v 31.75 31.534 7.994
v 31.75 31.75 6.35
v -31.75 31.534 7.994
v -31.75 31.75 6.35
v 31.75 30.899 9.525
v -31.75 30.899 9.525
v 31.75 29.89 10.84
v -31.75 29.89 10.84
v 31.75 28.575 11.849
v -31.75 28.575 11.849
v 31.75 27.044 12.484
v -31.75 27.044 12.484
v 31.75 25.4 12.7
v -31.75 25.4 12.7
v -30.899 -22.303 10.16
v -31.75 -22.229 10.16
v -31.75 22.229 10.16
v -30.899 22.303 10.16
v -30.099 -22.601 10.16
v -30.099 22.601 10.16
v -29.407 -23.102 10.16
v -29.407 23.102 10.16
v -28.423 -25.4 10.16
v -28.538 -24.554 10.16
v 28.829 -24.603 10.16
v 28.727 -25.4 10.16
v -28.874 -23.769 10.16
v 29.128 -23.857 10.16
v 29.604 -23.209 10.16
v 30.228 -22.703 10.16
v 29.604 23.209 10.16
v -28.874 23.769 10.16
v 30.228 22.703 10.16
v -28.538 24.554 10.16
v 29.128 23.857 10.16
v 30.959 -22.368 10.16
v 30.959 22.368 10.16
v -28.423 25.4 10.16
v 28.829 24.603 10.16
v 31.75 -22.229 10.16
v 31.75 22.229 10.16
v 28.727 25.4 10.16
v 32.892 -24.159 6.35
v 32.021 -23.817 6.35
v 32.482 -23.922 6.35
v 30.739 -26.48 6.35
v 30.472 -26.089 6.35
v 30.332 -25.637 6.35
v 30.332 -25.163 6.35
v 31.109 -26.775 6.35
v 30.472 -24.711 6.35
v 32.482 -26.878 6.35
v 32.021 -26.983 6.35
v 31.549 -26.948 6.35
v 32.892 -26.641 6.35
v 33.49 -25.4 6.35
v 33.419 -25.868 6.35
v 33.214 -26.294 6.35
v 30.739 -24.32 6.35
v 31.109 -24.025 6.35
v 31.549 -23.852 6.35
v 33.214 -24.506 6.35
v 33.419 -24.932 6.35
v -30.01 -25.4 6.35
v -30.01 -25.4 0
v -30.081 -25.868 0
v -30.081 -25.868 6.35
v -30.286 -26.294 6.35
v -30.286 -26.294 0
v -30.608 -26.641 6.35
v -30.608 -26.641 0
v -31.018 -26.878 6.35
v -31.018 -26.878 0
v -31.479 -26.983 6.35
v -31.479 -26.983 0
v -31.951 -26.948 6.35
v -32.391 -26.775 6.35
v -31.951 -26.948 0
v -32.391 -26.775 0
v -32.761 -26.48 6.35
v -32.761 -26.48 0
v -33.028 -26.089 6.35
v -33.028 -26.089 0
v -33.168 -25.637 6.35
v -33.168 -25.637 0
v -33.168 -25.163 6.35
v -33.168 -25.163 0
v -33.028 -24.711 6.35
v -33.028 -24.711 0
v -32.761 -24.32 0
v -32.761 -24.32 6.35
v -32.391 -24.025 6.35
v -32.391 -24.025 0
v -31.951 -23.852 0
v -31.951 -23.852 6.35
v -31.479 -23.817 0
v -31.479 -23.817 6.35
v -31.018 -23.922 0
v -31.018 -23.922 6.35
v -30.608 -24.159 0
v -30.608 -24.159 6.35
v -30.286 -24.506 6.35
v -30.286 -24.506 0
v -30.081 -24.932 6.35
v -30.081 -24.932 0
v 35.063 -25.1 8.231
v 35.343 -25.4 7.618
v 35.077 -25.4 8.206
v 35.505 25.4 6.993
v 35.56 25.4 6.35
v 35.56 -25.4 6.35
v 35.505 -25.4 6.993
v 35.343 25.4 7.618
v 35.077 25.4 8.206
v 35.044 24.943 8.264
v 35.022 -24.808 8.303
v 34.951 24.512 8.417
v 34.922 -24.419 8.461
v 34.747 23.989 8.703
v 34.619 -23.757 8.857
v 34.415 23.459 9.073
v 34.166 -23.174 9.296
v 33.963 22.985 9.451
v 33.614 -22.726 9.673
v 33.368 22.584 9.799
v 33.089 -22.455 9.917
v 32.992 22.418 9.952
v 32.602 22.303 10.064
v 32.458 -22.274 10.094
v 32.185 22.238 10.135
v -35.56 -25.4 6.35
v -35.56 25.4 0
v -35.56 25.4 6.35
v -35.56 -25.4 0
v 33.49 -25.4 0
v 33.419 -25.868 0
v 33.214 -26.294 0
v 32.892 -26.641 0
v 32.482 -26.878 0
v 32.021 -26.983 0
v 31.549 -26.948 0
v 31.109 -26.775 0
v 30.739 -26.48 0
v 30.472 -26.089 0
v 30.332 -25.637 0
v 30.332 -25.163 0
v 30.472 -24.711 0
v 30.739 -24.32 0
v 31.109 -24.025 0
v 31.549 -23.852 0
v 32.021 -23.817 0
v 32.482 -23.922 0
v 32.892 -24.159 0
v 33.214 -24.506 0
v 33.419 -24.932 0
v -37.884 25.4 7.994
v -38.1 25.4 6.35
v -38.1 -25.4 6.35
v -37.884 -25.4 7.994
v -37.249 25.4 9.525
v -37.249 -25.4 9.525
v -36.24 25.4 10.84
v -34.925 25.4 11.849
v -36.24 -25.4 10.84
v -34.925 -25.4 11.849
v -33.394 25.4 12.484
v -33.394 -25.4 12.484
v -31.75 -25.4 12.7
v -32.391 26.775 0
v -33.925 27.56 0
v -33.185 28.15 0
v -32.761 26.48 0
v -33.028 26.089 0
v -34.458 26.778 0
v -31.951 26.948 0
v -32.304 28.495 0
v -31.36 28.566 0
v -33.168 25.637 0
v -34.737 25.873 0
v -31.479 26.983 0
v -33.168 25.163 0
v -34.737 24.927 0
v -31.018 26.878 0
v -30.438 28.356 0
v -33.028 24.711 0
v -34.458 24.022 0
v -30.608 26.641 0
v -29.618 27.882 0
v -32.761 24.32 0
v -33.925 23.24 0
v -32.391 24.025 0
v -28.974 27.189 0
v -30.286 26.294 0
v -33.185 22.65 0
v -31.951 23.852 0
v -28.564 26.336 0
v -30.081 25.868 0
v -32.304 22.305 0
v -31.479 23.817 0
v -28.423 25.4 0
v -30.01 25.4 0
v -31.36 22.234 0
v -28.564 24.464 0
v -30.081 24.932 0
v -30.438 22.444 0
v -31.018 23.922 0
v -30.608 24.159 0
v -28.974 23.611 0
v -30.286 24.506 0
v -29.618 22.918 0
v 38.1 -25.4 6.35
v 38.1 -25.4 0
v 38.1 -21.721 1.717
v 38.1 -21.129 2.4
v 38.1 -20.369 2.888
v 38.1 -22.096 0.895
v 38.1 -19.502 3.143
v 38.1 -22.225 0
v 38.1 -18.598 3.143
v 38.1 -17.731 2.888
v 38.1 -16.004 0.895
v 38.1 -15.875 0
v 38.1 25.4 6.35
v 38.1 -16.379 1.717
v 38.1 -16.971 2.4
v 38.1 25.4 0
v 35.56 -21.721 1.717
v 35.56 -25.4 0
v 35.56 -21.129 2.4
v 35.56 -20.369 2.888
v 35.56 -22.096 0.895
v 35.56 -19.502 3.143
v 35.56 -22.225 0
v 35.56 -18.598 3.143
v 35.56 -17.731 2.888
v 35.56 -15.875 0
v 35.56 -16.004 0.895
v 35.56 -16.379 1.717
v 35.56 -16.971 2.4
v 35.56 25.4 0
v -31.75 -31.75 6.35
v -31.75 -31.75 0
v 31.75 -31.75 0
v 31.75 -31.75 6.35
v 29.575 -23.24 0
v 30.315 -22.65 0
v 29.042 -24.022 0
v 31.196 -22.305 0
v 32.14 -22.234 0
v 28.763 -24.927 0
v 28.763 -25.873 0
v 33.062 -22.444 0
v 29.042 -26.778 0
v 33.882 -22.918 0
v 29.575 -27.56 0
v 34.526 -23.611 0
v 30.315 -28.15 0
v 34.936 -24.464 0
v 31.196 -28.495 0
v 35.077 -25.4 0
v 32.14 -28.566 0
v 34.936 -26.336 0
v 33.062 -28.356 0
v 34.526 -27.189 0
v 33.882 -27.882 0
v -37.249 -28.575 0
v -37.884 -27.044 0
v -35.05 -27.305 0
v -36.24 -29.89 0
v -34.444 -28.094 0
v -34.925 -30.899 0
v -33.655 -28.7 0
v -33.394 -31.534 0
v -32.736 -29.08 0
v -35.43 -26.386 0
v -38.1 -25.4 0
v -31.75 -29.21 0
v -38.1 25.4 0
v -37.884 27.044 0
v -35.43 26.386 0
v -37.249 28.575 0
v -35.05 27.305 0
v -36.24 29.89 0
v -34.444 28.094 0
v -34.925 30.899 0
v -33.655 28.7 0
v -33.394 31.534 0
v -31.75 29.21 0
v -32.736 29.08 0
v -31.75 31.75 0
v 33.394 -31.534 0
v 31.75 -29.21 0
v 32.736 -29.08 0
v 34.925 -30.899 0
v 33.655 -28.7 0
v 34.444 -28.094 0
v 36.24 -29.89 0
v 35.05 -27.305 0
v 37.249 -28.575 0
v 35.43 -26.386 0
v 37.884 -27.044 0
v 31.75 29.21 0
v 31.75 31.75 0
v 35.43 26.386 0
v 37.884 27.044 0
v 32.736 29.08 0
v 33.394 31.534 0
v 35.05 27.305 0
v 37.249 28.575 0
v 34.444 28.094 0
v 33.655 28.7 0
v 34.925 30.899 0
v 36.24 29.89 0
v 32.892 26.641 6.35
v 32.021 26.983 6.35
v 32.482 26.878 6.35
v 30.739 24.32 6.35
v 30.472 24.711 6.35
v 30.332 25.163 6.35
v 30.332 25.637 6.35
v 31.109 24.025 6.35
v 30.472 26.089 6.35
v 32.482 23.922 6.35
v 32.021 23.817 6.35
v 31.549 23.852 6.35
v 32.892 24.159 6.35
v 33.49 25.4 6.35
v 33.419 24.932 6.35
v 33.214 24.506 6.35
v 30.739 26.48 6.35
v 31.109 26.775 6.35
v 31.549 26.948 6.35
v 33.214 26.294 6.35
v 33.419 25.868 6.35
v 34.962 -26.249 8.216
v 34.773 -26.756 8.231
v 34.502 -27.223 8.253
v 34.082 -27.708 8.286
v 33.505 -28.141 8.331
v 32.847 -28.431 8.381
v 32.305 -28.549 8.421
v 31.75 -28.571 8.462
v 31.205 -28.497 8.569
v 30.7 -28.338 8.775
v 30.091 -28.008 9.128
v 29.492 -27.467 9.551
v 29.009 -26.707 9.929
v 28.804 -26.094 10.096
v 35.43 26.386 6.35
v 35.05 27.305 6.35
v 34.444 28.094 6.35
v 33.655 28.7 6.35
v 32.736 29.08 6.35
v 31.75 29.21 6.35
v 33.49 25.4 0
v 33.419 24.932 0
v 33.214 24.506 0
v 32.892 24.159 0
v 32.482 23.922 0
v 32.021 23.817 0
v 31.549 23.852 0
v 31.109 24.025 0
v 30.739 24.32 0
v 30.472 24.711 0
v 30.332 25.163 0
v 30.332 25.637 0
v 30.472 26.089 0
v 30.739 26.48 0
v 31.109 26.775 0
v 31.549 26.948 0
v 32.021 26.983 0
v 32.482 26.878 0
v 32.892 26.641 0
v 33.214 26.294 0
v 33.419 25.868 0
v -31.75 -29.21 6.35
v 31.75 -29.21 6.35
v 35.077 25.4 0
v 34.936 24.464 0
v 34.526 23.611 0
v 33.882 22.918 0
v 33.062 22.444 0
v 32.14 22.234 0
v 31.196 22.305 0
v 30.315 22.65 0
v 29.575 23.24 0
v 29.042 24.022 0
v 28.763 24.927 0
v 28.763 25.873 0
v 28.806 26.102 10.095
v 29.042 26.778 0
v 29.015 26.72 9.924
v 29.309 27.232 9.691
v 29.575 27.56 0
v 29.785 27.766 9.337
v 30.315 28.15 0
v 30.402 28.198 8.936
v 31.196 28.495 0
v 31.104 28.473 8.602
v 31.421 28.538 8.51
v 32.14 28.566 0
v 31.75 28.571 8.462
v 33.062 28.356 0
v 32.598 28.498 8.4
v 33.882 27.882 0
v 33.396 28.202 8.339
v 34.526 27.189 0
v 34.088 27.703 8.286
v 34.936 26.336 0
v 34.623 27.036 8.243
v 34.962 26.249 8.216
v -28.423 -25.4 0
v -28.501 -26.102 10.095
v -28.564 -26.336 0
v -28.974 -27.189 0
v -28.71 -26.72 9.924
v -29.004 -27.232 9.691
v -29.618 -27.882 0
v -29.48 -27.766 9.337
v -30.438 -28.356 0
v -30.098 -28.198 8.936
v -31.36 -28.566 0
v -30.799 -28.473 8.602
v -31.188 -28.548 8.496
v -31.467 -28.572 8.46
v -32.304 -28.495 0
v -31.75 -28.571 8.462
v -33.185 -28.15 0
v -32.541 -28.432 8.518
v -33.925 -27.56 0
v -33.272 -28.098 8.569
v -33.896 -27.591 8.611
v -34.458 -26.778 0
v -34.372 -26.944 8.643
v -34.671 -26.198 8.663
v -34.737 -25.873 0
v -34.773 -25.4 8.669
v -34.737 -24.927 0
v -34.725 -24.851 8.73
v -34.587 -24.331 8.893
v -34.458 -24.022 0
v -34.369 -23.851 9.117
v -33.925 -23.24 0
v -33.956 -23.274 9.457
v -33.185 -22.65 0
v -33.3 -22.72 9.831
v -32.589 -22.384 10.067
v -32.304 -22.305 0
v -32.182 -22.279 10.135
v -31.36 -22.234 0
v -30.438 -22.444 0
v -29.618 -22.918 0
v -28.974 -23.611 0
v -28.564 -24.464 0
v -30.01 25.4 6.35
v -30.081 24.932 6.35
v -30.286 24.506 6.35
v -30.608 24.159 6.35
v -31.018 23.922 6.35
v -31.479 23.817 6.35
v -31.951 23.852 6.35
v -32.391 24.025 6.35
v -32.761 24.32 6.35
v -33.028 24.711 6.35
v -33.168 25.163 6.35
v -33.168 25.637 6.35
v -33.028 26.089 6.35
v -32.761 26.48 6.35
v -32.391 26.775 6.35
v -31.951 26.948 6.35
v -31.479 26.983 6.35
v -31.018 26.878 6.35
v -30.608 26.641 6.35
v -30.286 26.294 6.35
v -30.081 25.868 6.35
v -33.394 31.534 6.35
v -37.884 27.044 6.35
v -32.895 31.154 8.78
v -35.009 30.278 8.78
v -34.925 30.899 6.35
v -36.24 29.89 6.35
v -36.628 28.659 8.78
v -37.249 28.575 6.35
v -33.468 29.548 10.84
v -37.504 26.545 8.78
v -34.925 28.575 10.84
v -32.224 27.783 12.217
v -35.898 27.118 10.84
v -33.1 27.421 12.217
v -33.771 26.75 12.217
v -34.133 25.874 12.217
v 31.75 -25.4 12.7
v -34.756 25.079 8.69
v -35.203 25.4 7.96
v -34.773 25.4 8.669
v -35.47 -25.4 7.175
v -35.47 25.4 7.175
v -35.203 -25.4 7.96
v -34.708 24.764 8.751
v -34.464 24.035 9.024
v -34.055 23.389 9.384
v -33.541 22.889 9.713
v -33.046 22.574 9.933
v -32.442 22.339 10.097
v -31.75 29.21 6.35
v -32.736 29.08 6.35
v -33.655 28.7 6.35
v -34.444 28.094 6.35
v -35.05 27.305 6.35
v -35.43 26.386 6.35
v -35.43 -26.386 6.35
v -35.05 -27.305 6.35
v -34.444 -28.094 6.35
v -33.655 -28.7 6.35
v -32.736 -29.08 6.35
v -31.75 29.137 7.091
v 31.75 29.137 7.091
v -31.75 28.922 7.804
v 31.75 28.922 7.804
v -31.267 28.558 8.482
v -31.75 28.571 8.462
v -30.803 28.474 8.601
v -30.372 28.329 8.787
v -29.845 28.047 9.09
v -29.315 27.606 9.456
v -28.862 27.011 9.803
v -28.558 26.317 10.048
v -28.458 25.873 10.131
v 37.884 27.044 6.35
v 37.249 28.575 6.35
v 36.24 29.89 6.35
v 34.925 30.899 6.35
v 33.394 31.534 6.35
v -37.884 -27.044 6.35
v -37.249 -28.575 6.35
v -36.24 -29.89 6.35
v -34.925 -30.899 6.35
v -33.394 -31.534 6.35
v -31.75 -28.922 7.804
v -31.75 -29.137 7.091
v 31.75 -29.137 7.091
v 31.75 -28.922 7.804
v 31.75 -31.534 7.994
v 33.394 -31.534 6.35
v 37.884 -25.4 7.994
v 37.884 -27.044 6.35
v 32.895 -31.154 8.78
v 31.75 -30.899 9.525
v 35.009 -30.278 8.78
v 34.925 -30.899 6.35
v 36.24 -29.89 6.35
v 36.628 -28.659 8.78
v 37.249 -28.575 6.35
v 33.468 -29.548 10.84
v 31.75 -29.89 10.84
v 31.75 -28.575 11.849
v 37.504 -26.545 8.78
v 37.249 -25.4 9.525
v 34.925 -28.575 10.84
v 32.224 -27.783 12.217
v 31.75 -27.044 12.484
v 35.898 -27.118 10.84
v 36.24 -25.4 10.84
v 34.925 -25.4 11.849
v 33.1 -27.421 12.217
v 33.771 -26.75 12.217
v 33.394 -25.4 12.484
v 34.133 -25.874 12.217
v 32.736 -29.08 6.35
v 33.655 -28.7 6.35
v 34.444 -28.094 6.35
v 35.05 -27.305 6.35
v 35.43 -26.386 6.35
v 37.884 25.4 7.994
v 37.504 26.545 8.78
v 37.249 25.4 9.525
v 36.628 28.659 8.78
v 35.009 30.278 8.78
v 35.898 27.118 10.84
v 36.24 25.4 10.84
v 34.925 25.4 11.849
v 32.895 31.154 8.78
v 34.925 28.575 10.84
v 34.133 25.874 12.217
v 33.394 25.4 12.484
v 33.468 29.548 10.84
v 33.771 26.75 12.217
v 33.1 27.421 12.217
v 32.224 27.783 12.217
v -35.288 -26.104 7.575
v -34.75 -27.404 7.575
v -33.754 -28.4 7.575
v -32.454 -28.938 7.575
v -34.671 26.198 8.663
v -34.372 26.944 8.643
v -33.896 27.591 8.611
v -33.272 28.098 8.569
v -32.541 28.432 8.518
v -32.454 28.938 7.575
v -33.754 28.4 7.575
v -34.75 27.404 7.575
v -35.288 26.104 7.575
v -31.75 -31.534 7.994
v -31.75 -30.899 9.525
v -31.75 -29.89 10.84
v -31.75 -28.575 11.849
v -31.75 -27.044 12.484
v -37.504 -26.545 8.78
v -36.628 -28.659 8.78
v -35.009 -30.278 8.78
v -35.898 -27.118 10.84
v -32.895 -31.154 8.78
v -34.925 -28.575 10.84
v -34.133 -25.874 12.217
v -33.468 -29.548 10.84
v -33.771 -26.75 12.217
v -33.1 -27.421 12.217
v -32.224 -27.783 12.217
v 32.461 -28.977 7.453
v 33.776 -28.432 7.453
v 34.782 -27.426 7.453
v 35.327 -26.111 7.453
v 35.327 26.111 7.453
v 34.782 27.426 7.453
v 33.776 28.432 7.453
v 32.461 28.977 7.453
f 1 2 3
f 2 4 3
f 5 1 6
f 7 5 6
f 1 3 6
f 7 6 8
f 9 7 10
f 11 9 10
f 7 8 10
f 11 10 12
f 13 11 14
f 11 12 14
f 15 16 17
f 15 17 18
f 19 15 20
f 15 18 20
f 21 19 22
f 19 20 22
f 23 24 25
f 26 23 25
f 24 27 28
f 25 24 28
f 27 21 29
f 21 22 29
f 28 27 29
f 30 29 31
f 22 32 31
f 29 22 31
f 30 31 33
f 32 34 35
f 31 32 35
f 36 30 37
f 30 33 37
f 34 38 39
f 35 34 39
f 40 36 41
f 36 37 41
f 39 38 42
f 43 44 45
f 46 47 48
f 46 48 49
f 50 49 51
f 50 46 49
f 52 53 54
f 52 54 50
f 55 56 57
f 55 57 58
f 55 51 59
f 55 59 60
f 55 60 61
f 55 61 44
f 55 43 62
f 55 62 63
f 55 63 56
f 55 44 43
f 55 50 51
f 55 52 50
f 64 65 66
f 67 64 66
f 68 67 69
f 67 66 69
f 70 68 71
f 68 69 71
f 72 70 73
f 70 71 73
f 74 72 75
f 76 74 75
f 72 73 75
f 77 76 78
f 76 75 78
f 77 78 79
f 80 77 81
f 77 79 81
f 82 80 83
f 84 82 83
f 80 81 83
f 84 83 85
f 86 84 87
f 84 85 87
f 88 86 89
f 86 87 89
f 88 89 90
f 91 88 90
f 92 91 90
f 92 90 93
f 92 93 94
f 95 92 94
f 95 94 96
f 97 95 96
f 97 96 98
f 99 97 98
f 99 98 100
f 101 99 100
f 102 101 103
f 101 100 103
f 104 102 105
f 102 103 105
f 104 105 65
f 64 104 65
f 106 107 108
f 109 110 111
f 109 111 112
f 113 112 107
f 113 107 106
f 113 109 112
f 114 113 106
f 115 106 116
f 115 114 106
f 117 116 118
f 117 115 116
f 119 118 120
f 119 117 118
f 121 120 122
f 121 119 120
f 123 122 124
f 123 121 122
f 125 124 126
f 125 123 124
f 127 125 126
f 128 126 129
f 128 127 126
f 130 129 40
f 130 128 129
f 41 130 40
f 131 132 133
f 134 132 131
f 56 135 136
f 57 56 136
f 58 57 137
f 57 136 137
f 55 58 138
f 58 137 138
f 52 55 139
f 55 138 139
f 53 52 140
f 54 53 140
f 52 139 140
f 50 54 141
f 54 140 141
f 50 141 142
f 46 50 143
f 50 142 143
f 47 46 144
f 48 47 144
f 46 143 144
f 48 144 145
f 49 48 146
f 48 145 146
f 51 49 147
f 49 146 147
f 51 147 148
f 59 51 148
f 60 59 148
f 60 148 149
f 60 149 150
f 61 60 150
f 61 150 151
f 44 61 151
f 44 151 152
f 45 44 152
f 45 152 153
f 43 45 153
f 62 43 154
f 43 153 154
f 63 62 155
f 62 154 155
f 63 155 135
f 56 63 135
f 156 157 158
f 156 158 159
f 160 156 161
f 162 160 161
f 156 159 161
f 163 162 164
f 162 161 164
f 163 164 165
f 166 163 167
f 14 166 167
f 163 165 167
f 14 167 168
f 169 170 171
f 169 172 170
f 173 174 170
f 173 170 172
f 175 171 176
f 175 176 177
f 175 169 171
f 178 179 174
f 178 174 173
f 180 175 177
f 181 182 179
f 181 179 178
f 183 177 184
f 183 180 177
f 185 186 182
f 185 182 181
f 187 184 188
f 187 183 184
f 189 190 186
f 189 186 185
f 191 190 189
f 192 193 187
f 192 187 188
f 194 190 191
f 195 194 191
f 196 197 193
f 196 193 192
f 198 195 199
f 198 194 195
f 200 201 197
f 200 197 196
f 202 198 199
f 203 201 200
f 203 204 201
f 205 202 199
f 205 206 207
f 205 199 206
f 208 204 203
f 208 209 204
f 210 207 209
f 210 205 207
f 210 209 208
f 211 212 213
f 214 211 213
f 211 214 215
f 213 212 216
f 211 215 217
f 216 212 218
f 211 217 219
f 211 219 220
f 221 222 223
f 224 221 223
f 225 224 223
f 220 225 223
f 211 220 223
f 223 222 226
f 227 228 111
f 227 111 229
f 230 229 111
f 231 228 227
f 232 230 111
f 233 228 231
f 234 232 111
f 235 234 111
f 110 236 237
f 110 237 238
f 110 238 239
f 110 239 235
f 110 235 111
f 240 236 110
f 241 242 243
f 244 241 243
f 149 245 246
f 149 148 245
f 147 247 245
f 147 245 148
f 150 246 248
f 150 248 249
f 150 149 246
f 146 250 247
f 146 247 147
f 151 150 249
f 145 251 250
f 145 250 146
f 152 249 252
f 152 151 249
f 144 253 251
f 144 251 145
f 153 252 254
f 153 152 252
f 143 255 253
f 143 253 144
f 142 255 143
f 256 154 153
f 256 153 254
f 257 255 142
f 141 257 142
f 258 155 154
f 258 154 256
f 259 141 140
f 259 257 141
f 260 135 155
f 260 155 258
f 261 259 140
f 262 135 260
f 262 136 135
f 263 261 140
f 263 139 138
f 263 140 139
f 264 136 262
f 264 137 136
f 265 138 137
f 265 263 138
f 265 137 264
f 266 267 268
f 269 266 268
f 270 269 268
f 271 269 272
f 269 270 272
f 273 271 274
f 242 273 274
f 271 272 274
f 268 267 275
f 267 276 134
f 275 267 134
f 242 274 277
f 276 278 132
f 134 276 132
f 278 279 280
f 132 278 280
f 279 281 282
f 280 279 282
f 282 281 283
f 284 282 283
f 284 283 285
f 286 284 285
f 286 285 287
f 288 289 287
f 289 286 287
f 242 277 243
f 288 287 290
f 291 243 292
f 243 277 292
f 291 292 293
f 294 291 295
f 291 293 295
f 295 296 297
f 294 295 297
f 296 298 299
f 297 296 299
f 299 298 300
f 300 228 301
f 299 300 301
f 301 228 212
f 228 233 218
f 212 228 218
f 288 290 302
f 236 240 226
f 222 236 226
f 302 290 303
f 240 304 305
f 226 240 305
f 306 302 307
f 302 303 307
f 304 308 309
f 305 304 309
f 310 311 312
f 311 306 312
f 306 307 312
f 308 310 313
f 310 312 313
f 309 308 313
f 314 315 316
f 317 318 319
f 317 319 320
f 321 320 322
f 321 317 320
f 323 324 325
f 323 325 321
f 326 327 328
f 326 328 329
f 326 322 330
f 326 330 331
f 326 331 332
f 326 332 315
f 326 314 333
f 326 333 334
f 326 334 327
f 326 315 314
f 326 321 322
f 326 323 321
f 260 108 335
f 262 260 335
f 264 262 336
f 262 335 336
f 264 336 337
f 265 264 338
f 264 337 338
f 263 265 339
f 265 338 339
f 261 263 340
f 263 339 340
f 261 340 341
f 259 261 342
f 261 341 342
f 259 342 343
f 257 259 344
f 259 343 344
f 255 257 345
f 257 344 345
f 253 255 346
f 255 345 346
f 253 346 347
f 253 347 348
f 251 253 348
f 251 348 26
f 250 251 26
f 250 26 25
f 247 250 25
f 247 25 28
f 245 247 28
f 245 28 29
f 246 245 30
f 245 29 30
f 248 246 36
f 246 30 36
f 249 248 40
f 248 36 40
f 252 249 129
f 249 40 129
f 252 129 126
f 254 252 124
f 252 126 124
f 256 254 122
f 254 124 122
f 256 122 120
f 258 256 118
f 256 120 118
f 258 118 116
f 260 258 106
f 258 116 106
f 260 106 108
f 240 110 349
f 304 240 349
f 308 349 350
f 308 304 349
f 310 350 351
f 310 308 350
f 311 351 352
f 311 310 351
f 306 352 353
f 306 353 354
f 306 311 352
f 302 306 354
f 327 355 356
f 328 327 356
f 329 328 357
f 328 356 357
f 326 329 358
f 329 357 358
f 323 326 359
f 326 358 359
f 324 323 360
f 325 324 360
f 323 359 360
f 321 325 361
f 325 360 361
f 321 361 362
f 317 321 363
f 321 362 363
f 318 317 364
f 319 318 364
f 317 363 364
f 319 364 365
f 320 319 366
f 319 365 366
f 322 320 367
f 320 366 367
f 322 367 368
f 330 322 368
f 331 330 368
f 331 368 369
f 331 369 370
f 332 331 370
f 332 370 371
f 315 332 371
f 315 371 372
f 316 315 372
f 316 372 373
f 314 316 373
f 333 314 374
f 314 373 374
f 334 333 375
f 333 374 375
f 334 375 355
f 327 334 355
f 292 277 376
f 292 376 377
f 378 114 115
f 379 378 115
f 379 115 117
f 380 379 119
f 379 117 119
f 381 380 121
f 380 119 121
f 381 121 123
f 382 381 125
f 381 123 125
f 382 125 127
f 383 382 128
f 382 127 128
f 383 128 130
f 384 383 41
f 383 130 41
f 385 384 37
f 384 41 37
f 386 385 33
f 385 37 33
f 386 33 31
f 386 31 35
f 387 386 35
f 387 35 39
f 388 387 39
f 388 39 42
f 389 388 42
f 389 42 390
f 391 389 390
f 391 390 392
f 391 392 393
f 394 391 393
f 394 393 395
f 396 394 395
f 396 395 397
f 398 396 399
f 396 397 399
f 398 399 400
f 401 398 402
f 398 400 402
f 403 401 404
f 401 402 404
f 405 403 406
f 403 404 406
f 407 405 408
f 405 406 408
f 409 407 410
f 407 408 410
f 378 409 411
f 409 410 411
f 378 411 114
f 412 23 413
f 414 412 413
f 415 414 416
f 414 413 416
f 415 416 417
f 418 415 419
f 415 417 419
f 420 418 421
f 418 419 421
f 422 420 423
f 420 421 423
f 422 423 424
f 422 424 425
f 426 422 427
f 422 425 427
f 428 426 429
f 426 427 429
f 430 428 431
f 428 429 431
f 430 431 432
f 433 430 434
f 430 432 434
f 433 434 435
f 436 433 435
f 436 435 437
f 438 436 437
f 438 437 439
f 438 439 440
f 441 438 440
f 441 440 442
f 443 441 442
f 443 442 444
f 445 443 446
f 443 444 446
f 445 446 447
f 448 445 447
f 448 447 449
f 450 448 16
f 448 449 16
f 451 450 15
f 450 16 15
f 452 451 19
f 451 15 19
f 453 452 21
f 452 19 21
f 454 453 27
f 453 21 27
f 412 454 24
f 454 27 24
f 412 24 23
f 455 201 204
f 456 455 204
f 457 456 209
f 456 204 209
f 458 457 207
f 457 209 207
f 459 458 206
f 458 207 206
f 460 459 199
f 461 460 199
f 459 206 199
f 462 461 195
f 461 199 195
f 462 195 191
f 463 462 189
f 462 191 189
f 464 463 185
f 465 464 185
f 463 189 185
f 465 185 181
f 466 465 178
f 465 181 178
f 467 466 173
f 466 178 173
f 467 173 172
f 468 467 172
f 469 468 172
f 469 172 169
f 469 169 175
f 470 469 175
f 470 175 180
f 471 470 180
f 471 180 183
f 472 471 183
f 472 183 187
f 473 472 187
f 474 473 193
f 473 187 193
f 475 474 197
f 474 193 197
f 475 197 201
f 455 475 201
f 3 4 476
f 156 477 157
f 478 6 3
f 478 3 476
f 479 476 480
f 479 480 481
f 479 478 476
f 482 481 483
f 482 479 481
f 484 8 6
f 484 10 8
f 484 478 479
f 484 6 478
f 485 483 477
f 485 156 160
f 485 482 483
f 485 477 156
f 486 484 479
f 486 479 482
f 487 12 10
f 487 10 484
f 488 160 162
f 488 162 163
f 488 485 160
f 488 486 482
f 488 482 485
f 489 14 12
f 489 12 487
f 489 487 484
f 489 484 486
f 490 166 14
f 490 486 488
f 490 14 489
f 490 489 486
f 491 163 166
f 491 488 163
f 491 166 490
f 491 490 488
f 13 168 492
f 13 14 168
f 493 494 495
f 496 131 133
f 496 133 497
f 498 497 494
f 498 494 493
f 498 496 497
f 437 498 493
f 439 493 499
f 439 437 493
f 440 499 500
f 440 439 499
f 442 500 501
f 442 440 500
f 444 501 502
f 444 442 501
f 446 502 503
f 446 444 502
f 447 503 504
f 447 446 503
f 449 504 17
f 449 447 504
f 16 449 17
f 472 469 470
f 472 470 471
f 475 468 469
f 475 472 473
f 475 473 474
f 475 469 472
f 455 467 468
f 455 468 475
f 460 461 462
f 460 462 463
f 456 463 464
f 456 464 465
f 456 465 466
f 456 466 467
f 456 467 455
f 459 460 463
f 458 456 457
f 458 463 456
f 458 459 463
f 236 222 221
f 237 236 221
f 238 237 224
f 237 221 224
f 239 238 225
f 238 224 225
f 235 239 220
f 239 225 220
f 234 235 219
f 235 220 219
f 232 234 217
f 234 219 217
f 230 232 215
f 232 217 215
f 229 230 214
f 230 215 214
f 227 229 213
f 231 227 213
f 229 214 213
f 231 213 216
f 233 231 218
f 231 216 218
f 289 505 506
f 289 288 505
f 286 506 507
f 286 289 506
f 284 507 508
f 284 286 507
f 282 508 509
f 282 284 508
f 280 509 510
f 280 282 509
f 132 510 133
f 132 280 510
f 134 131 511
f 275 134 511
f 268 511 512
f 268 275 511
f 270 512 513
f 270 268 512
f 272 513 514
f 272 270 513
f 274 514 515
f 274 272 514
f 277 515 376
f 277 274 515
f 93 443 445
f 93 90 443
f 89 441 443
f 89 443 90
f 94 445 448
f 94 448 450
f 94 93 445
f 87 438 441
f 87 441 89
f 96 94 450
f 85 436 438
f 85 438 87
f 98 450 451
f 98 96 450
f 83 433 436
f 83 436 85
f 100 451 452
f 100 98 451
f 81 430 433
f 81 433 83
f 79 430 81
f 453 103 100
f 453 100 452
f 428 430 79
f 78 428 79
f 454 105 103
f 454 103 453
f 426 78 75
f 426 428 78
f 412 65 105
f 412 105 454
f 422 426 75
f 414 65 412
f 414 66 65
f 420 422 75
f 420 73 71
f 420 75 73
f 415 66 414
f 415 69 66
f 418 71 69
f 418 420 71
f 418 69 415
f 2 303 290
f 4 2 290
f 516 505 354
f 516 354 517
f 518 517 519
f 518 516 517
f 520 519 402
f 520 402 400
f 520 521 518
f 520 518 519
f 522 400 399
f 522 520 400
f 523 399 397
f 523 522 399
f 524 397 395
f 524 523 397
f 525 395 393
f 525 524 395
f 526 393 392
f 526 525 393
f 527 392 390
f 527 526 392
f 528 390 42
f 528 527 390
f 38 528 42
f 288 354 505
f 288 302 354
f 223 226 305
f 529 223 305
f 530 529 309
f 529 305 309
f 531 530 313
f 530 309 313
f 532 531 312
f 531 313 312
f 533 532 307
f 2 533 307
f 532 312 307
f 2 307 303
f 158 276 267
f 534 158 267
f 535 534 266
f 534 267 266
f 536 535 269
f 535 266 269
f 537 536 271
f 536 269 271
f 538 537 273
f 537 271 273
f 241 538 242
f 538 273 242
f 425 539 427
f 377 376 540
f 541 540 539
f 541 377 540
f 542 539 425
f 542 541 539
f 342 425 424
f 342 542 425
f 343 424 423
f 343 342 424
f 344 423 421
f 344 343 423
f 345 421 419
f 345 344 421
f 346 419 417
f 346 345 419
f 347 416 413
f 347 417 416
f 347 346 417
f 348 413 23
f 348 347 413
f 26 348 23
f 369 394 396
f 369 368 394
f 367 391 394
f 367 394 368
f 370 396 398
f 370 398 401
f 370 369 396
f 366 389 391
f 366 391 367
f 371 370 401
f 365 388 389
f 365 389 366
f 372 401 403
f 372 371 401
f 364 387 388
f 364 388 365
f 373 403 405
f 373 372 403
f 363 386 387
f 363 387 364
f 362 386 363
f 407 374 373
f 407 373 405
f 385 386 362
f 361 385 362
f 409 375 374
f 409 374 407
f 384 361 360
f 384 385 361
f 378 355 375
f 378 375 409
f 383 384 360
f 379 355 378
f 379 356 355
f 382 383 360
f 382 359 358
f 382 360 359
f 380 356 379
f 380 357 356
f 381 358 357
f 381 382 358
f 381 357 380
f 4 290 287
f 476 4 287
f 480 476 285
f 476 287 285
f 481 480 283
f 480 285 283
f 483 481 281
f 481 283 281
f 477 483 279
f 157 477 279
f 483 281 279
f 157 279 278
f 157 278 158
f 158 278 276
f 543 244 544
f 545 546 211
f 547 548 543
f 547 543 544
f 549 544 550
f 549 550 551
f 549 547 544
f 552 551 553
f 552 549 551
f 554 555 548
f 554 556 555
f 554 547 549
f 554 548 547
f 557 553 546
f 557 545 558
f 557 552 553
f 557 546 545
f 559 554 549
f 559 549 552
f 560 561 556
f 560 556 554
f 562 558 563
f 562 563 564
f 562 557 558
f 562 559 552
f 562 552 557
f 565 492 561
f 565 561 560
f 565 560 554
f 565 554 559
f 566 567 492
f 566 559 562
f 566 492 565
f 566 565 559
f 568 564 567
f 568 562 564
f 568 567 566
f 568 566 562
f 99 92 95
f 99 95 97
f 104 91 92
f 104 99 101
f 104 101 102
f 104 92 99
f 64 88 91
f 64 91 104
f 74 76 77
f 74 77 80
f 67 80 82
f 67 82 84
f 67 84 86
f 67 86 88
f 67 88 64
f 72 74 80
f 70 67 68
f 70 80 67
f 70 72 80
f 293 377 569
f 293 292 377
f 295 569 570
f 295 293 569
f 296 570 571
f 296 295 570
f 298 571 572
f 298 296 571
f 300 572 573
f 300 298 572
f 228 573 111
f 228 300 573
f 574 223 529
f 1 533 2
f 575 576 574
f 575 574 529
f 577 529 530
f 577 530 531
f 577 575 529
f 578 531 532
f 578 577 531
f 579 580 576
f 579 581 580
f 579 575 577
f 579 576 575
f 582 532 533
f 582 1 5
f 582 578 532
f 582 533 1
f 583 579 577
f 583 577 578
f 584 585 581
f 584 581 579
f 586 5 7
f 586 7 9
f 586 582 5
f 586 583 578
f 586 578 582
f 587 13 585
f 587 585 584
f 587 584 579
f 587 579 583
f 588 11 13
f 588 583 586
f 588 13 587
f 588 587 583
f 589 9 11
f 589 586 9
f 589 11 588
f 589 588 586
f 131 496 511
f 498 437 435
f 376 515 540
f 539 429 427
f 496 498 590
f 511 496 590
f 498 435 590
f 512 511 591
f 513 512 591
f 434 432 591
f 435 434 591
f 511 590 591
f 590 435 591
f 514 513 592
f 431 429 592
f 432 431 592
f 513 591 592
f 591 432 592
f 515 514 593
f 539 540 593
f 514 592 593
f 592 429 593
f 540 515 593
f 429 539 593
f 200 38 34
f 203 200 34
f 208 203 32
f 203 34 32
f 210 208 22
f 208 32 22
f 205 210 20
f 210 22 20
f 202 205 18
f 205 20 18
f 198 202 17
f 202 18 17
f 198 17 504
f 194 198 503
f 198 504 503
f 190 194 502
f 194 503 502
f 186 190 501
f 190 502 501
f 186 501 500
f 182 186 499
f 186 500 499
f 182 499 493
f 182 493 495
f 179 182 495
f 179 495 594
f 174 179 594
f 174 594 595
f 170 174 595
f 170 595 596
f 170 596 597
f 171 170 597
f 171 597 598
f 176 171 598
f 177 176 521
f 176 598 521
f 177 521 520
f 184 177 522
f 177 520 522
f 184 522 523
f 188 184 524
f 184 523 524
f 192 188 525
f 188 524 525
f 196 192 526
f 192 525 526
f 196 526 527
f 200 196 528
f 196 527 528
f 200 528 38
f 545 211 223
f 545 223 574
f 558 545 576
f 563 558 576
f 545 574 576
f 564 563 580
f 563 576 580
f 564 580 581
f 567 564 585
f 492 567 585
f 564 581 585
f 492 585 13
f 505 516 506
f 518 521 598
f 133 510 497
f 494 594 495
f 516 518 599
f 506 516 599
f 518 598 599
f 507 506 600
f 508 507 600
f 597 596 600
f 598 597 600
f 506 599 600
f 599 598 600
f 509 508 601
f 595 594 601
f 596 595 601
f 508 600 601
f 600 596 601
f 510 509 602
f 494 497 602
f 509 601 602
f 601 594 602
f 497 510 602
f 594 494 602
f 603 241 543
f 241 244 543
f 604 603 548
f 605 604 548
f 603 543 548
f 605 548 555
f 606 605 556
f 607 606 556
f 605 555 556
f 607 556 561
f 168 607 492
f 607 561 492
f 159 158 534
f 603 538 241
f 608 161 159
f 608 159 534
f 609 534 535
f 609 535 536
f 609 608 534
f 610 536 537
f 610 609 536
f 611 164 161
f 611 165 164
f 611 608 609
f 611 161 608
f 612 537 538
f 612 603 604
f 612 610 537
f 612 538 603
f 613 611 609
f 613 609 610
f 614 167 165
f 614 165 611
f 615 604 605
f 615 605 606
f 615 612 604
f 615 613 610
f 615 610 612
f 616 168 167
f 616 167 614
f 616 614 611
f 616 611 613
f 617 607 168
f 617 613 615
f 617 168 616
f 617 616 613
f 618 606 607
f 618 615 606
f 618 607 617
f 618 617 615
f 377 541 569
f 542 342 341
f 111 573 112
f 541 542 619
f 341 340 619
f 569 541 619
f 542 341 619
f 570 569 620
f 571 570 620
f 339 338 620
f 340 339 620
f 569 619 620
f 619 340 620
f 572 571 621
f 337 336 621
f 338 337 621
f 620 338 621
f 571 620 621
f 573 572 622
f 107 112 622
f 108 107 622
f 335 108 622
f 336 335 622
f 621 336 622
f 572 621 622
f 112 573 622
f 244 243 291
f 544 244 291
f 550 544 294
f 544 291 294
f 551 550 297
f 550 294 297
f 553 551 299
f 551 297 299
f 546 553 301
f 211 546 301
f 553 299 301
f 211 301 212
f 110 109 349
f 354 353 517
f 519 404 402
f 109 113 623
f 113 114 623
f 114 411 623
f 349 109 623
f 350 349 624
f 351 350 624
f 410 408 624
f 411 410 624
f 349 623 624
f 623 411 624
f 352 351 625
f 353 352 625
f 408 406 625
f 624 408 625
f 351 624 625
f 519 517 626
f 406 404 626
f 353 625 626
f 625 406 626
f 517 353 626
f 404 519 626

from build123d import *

# Parameters (mm, degrees)
F1_DEPTH  = 12.7
F2_R      = 6.35
F3_T      = -2.54
F4_R      = 3.175
F5_DEPTH  = 73.66
F7_R      = 3.175
F8_DEPTH  = 10.16
F9_R      = 1.5875
F10_DEPTH = 6.35


with BuildPart() as f1:
    # F0 (on Top) → F1 (new body)
    with BuildSketch(Plane.XY):
        with BuildLine():
            Line((-31.75, -31.75), (31.75, -31.75))
            ThreePointArc((31.75, -31.75), (36.2401280605, -29.8901280605), (38.1, -25.4))
            Line((38.1, -25.4), (38.1, 25.4))
            ThreePointArc((38.1, 25.4), (36.2401280605, 29.8901280605), (31.75, 31.75))
            Line((31.75, 31.75), (-31.75, 31.75))
            ThreePointArc((-31.75, 31.75), (-36.2401280605, 29.8901280605), (-38.1, 25.4))
            Line((-38.1, 25.4), (-38.1, -25.4))
            ThreePointArc((-38.1, -25.4), (-36.2401280605, -29.8901280605), (-31.75, -31.75))
        make_face()
    extrude(amount=F1_DEPTH)

    # F2
    f2_edges = [f1.edges().sort_by_distance(p)[0] for p in [
        (0, -31.75, 12.7),
        (36.240128, -29.890128, 12.7),
        (38.1, 0, 12.7),
        (36.240128, 29.890128, 12.7),
        (0, 31.75, 12.7),
        (-36.240128, 29.890128, 12.7),
        (-38.1, 0, 12.7),
        (-36.240128, -29.890128, 12.7),
    ]]
    fillet(f2_edges, radius=F2_R)

    # F3
    f3_openings = [f1.faces().sort_by_distance(p)[0] for p in [
        (0, 0, 0),
    ]]
    offset(amount=F3_T, openings=f3_openings)

    # F4 (on face) → F5 (cut, through all)
    with BuildSketch(Plane.YZ.offset(38.1)):
        with Locations((-19.05, 0)):
            Circle(F4_R)
    extrude(amount=-F5_DEPTH, mode=Mode.SUBTRACT)

    # F7 (on offset) → F8 (join, through all)
    with BuildSketch(Plane(origin=(0, 0, 10.16), x_dir=(1, 0, 0), z_dir=(0, 0, -1))):
        with Locations((-31.5977446735, 25.4)):
            Circle(F7_R)
        with Locations((-31.5977446735, -25.4)):
            Circle(F7_R)
        with Locations((31.9022553265, 25.4)):
            Circle(F7_R)
        with Locations((31.9022553265, -25.4)):
            Circle(F7_R)
    extrude(amount=F8_DEPTH)

    # F9 (on face) → F10 (cut)
    with BuildSketch(Plane(origin=(0, 0, 0), x_dir=(1, 0, 0), z_dir=(0, 0, -1))):
        with Locations((-31.5977446735, 25.4)):
            Circle(F9_R)
        with Locations((-31.5977446735, -25.4)):
            Circle(F9_R)
        with Locations((31.9022553265, 25.4)):
            Circle(F9_R)
        with Locations((31.9022553265, -25.4)):
            Circle(F9_R)
    extrude(amount=-F10_DEPTH, mode=Mode.SUBTRACT)


solid = f1.part
